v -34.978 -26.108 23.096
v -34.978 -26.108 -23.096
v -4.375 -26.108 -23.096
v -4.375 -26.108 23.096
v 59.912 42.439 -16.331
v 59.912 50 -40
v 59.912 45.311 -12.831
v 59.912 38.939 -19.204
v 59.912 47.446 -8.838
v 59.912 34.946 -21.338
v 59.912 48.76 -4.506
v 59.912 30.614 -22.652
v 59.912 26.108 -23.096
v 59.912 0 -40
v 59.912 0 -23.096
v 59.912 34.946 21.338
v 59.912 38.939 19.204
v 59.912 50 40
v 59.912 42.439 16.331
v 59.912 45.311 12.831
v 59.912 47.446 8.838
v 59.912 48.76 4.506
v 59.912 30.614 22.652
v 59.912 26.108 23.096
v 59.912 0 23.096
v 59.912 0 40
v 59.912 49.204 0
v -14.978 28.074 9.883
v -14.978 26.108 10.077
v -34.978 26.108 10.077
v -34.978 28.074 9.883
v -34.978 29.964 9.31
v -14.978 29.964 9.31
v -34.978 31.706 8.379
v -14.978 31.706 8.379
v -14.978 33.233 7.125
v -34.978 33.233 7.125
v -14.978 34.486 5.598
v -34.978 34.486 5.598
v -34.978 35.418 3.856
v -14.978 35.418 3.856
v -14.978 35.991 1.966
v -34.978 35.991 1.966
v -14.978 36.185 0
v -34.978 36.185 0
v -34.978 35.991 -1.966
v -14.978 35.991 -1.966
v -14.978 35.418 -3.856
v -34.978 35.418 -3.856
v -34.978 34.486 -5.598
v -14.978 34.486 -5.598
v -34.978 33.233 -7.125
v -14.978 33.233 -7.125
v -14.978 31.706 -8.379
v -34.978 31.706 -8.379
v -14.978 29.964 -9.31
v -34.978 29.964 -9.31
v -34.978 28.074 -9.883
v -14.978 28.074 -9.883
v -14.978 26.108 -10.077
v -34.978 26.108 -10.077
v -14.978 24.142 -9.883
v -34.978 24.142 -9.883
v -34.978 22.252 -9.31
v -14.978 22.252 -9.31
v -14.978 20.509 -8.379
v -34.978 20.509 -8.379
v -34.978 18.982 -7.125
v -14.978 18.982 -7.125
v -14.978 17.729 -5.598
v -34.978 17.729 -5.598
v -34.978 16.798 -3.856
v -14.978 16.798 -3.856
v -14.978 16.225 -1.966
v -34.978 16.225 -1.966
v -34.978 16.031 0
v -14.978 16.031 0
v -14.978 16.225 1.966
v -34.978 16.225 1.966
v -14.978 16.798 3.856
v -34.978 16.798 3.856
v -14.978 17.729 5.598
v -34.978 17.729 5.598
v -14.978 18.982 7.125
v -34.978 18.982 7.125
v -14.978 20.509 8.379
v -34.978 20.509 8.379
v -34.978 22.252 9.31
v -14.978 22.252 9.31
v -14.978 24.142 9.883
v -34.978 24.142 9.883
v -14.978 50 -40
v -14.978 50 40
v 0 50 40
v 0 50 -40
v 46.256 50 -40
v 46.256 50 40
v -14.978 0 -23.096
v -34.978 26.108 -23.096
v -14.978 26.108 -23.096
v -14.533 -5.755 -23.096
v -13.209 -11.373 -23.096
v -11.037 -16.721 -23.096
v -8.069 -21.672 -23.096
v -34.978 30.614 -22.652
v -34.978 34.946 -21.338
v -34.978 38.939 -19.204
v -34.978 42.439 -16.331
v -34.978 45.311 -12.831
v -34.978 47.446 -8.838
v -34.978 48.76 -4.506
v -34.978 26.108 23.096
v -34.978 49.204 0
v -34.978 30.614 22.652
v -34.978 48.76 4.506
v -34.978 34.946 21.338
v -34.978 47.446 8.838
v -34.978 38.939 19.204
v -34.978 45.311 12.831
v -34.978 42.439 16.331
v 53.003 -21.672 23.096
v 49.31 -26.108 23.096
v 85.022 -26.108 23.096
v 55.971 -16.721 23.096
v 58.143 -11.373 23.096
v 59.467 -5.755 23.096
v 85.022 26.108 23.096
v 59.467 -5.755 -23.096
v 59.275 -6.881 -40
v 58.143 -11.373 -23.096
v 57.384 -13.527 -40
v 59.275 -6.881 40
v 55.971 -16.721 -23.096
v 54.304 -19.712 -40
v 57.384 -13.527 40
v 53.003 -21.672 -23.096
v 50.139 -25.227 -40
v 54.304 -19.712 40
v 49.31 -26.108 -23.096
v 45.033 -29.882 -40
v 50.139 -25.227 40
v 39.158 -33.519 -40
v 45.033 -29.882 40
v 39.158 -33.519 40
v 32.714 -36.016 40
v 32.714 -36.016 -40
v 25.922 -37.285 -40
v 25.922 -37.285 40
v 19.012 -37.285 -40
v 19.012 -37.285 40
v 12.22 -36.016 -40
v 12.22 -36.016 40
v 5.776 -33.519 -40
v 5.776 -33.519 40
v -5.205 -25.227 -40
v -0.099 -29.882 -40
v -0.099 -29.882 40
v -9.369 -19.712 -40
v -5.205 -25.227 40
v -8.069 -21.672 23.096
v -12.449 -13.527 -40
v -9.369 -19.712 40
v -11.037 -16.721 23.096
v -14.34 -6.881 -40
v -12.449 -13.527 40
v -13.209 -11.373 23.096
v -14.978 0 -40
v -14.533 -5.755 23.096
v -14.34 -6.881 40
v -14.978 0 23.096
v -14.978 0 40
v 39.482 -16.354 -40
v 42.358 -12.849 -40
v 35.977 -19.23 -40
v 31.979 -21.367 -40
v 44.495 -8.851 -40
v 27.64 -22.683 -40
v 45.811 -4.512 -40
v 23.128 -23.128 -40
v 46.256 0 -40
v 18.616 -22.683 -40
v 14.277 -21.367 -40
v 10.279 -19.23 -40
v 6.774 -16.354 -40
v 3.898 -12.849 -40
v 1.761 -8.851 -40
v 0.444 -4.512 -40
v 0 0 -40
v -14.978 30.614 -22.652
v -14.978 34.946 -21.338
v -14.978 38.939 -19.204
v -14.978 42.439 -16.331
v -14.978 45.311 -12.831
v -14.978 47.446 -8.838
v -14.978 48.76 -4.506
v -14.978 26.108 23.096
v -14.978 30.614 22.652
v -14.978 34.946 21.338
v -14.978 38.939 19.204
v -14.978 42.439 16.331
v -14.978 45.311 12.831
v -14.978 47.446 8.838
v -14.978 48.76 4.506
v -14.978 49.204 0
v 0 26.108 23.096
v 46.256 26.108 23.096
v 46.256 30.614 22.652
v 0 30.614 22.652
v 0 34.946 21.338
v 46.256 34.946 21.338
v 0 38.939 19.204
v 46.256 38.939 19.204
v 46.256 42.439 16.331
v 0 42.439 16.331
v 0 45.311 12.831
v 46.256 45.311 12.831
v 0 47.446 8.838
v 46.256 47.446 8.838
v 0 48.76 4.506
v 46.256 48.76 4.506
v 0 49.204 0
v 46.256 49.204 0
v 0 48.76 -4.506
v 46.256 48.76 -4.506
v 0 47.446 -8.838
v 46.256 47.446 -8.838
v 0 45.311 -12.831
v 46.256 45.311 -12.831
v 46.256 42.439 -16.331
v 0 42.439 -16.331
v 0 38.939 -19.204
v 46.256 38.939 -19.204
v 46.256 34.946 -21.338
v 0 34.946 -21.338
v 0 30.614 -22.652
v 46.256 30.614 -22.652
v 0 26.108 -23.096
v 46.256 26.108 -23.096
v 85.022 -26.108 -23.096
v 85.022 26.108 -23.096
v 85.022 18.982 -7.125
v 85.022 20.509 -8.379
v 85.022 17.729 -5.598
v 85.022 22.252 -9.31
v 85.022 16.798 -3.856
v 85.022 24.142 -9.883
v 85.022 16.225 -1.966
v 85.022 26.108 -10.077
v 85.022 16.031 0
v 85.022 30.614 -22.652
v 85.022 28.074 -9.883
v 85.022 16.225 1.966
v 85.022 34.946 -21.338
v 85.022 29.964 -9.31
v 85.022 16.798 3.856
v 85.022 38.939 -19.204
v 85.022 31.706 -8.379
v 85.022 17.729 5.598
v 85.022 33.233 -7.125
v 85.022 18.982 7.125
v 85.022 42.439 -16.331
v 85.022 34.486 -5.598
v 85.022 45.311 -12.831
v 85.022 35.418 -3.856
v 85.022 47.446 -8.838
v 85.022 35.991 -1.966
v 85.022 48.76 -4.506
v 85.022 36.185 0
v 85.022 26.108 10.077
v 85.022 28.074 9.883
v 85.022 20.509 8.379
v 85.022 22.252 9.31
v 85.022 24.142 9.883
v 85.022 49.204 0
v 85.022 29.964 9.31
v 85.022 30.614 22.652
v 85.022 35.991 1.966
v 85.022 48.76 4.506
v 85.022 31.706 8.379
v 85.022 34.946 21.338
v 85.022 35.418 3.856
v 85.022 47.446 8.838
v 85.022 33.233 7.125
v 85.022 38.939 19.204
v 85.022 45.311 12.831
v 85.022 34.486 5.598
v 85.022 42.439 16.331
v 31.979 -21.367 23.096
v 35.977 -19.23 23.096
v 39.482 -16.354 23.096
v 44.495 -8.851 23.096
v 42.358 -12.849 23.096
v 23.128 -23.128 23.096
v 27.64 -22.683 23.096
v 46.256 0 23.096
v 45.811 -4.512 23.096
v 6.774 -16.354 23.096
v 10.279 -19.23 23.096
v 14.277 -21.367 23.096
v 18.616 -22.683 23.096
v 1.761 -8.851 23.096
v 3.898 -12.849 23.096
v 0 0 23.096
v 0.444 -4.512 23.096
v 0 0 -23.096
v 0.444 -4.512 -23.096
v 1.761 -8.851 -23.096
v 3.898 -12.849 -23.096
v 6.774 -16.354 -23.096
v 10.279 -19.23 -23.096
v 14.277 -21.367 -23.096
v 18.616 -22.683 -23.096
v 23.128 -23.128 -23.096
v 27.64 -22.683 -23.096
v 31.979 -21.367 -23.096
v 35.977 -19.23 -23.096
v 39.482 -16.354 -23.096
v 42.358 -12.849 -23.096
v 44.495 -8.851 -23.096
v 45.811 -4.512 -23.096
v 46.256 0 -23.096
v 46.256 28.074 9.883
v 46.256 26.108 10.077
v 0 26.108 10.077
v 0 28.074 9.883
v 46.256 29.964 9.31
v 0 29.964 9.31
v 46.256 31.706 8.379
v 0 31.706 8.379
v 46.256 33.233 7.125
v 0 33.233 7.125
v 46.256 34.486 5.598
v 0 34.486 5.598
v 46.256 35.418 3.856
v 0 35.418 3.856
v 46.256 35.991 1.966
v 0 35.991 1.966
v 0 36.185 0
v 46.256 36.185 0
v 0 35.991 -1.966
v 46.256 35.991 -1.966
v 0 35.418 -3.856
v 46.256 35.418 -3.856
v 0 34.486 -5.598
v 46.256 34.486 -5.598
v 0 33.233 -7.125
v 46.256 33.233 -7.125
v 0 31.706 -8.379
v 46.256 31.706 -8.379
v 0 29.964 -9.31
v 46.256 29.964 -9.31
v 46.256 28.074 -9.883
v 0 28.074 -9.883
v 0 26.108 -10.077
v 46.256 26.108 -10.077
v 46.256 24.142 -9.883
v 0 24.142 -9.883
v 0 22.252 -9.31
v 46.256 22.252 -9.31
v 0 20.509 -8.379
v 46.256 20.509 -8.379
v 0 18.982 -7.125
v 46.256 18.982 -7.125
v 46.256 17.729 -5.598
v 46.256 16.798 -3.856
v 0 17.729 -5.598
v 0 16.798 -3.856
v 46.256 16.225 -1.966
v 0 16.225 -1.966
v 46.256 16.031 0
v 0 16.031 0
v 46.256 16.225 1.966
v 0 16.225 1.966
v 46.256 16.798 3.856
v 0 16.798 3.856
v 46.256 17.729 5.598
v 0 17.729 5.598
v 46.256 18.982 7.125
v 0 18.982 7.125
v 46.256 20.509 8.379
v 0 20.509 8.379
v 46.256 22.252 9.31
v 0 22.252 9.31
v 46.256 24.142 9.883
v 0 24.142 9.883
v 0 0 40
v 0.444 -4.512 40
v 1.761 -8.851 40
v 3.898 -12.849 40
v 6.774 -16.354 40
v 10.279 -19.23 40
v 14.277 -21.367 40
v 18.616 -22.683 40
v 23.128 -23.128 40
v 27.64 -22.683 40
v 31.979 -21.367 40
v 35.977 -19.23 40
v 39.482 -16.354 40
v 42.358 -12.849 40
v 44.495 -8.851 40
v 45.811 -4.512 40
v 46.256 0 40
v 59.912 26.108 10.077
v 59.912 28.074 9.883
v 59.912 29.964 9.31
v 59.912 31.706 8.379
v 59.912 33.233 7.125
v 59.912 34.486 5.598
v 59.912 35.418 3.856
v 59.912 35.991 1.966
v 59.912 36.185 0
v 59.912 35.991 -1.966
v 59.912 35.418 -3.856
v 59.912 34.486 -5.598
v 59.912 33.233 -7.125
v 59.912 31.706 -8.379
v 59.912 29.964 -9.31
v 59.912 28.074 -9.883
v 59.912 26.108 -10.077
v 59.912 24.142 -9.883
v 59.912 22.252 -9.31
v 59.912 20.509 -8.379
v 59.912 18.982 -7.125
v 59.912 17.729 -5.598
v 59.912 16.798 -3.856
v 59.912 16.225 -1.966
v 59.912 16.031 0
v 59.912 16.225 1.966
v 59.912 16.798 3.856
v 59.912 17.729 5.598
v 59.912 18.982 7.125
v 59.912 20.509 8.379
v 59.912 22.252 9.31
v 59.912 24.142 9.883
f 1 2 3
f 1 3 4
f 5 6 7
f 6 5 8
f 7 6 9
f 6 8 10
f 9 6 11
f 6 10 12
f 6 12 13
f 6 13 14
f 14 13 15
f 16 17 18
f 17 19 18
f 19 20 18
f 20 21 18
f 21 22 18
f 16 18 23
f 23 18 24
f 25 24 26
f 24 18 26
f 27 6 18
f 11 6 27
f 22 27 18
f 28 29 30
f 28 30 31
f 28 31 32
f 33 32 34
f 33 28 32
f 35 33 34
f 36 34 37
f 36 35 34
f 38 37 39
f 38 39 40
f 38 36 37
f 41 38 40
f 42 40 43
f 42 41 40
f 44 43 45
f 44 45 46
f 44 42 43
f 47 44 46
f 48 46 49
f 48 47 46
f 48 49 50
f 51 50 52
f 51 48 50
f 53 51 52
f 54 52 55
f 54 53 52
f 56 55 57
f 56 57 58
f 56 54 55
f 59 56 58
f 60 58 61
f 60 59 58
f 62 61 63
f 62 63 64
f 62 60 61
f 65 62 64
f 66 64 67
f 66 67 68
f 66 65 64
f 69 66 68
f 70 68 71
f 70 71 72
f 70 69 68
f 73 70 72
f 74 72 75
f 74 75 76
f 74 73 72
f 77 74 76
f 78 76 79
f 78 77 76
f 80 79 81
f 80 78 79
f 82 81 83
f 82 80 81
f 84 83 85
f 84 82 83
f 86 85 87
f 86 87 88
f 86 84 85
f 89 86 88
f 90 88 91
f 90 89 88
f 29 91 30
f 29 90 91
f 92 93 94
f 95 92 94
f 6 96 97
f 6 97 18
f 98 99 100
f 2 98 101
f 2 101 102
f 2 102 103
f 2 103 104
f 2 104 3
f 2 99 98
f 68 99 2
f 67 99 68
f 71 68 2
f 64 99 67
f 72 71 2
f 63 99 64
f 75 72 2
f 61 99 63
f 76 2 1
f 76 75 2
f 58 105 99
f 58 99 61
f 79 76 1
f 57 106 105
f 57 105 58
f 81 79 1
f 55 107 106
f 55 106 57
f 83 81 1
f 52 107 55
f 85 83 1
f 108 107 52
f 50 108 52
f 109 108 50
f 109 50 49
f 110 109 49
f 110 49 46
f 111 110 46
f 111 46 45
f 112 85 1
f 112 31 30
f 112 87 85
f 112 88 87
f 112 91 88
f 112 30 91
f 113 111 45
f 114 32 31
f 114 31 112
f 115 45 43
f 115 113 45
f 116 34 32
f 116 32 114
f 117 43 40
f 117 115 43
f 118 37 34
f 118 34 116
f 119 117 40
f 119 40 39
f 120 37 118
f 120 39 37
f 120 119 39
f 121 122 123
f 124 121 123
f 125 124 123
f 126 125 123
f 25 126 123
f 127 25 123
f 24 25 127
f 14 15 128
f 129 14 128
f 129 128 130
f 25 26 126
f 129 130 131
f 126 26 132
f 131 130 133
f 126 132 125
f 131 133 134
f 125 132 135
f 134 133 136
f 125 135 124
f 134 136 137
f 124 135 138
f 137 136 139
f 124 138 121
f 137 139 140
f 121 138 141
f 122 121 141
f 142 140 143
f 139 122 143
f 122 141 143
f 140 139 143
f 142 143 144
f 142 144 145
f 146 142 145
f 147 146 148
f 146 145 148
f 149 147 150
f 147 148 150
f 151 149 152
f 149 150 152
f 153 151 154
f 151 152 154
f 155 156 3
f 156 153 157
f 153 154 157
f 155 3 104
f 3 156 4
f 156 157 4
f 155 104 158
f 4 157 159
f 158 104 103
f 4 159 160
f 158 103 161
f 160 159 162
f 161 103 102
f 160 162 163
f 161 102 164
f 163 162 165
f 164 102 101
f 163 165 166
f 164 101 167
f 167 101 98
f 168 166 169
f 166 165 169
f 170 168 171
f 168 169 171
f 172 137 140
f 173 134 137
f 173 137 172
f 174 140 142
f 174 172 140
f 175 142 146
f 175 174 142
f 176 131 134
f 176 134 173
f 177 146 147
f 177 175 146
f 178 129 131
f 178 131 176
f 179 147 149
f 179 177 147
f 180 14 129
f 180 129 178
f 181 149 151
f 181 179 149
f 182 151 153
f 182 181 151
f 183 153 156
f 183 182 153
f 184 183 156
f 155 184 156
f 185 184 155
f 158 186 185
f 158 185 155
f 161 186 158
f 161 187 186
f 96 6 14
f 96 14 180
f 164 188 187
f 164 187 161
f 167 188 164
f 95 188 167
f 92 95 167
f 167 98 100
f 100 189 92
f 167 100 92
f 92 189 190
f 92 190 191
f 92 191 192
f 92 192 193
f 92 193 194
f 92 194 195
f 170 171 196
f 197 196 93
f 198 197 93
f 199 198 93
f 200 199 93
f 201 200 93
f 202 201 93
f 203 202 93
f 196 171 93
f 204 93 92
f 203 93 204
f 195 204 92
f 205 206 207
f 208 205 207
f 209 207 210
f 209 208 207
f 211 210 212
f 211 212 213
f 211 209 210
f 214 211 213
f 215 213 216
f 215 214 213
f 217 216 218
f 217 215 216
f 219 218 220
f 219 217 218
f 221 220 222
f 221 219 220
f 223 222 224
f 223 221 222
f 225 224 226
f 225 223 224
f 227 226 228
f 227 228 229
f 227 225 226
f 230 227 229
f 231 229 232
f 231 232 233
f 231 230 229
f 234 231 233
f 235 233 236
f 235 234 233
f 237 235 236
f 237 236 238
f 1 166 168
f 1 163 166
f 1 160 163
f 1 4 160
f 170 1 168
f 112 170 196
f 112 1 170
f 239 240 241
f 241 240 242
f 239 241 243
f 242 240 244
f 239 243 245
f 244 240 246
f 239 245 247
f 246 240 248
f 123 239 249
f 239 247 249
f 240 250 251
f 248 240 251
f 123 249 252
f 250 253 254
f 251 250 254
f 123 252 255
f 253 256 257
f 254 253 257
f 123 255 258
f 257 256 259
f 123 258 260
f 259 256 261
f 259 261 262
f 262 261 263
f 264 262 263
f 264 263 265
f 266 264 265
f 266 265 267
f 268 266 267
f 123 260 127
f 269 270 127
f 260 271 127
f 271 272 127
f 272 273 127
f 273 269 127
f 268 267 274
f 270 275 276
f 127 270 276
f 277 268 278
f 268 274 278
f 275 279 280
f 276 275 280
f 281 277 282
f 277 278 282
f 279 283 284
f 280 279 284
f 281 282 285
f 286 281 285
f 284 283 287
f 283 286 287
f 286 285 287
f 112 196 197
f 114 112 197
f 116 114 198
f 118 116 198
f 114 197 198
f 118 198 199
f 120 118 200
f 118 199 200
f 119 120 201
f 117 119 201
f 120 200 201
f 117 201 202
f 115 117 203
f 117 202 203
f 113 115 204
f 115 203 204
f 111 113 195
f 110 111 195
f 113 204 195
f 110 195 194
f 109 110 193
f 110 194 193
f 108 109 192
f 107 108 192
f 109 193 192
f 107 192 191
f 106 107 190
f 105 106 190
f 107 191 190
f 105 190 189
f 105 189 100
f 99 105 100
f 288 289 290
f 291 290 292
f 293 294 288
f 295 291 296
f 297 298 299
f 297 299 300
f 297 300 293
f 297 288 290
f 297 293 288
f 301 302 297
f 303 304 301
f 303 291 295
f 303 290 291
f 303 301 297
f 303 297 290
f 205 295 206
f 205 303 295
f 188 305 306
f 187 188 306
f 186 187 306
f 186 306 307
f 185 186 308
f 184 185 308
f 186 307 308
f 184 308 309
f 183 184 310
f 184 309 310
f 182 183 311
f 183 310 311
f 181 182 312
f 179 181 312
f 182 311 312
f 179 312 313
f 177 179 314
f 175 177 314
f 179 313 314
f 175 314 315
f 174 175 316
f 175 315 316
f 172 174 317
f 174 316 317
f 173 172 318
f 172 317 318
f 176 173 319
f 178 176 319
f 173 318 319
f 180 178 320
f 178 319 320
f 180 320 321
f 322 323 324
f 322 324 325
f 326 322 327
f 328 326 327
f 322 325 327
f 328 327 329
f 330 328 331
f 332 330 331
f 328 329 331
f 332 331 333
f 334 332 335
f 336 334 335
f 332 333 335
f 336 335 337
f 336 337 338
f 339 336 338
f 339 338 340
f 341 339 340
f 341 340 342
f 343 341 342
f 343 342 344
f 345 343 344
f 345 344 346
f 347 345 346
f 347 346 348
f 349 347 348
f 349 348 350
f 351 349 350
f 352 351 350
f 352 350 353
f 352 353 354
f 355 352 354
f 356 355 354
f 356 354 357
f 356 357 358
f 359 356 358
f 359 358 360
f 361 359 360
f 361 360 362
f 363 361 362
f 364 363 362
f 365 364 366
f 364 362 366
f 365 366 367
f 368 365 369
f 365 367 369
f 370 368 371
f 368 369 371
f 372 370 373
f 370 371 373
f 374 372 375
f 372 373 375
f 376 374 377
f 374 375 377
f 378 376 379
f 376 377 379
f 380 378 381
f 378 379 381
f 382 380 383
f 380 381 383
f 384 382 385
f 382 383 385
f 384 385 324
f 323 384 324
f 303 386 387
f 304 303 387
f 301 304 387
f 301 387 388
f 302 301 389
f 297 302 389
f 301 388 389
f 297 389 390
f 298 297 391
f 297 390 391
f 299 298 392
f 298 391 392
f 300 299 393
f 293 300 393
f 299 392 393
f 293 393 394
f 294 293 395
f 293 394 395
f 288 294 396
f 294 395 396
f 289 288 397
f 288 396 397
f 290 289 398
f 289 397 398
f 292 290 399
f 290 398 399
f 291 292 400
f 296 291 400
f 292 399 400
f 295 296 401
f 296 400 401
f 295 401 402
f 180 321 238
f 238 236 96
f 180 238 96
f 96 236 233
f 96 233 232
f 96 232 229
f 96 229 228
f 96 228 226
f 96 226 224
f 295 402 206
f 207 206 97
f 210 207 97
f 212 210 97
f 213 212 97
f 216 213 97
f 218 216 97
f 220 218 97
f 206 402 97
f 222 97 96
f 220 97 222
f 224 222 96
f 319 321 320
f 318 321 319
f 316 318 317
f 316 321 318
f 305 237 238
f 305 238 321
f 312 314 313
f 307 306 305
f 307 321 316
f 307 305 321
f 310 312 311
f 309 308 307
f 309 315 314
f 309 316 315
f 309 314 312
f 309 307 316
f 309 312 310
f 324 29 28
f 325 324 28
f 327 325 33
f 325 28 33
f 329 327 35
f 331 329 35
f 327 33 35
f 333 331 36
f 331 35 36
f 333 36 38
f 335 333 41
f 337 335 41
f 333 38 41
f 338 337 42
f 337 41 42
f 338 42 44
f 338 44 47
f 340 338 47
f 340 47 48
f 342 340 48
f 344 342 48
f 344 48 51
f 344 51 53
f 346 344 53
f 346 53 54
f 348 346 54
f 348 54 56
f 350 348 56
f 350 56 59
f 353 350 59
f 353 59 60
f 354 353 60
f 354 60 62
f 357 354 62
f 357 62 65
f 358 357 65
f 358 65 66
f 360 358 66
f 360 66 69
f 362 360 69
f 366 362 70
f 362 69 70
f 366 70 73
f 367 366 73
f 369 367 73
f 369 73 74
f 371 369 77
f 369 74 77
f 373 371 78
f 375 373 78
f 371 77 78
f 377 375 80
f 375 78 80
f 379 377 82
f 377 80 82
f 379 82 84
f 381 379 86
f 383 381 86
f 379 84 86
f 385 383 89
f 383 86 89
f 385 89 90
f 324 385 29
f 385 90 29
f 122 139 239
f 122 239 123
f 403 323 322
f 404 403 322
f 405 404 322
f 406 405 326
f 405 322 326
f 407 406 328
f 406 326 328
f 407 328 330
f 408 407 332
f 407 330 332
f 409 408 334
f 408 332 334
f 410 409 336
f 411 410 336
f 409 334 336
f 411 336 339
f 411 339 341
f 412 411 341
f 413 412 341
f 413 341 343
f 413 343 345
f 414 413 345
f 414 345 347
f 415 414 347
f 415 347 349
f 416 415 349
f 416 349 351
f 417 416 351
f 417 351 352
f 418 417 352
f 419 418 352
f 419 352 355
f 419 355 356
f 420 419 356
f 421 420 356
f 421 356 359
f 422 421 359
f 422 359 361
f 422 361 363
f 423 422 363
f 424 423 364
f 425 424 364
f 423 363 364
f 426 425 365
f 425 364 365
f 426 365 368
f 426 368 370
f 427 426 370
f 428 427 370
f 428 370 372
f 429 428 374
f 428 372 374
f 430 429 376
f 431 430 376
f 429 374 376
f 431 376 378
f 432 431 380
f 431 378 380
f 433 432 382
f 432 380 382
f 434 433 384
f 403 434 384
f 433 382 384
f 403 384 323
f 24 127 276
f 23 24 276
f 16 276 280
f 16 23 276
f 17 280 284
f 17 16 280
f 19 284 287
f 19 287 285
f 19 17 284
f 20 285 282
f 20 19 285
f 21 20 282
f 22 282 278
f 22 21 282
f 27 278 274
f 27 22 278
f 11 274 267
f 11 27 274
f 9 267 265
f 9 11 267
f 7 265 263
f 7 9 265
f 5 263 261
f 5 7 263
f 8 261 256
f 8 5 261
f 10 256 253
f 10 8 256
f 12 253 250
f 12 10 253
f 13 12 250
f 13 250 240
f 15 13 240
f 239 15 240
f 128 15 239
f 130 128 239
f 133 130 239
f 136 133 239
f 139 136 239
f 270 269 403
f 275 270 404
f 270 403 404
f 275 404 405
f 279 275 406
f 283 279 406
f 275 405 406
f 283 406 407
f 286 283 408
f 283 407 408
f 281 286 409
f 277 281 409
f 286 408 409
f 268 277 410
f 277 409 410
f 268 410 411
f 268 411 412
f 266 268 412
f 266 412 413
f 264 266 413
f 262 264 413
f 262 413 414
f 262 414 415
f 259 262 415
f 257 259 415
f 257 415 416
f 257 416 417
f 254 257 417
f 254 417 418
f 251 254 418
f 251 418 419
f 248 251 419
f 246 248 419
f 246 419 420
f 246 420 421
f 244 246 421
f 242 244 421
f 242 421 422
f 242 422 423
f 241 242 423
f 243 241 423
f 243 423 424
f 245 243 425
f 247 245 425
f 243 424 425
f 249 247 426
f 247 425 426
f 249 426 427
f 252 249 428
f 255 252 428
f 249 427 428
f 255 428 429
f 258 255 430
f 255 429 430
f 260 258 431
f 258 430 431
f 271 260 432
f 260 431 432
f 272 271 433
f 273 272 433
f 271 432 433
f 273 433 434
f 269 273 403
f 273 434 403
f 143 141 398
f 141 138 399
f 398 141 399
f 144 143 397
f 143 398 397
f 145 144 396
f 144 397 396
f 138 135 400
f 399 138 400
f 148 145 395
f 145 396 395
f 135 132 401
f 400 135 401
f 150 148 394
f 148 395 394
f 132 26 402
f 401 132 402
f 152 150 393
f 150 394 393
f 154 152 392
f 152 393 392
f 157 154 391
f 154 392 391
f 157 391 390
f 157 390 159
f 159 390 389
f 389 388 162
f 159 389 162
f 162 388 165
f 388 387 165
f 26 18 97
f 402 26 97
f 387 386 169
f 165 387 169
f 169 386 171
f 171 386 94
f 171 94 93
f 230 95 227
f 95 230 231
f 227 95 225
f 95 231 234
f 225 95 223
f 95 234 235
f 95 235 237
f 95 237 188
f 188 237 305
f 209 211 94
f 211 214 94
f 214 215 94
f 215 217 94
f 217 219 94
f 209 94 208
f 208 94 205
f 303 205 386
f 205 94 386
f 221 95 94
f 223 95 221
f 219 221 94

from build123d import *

# Parameters (mm, degrees)
BOSS_EXTRUDE1_DEPTH      = 40
SKETCH2_R                = 10.076891008
BOSS_EXTRUDE2_DEPTH      = 20
BOSS_EXTRUDE2_DEPTH_BACK = 100
SKETCH5_R                = 10.076891008
CUT_EXTRUDE1_DEPTH       = 101


with BuildPart() as part:
    # Sketch1 → Boss-Extrude1 (new body, symmetric)
    with BuildSketch(Plane.XY):
        with BuildLine():
            Line((0, 50.000244442), (0, 0))
            ThreePointArc((0, 0), (23.127866372, -23.127866372), (46.255732744, 0))
            Line((46.255732744, 0), (46.255732744, 50.000244442))
            Line((46.255732744, 50.000244442), (59.912187173, 50.000244442))
            Line((59.912187173, 50.000244442), (59.912187173, 0))
            ThreePointArc((59.912187173, 0), (22.46707019, -37.445116983), (-14.978046793, 0))
            Line((-14.978046793, 0), (-14.978046793, 50.000244442))
            Line((-14.978046793, 50.000244442), (0, 50.000244442))
        make_face()
    extrude(amount=BOSS_EXTRUDE1_DEPTH, both=True)

    # Sketch2 → Boss-Extrude2 (add, two sides)
    with BuildSketch(Plane.ZY.offset(14.978046793)) as boss_extrude2_sk:
        with BuildLine():
            Line((-23.095980377, -26.1078298), (23.095980377, -26.1078298))
            Line((23.095980377, -26.1078298), (23.095980377, 26.1078298))
            ThreePointArc((23.095980377, 26.1078298), (0, 49.203810178), (-23.095980377, 26.1078298))
            Line((-23.095980377, 26.1078298), (-23.095980377, -26.1078298))
        make_face()
        with Locations((0, 26.1078298)):
            Circle(SKETCH2_R, mode=Mode.SUBTRACT)
    extrude(amount=BOSS_EXTRUDE2_DEPTH)
    extrude(boss_extrude2_sk.sketch, amount=-BOSS_EXTRUDE2_DEPTH_BACK)

    # Sketch5 → Cut-Extrude1 (cut, through all)
    with BuildSketch(Plane.ZY.offset(14.978046793)):
        with Locations((0, 26.1078298)):
            Circle(SKETCH5_R)
    extrude(amount=-CUT_EXTRUDE1_DEPTH, mode=Mode.SUBTRACT)


solid = part.part
